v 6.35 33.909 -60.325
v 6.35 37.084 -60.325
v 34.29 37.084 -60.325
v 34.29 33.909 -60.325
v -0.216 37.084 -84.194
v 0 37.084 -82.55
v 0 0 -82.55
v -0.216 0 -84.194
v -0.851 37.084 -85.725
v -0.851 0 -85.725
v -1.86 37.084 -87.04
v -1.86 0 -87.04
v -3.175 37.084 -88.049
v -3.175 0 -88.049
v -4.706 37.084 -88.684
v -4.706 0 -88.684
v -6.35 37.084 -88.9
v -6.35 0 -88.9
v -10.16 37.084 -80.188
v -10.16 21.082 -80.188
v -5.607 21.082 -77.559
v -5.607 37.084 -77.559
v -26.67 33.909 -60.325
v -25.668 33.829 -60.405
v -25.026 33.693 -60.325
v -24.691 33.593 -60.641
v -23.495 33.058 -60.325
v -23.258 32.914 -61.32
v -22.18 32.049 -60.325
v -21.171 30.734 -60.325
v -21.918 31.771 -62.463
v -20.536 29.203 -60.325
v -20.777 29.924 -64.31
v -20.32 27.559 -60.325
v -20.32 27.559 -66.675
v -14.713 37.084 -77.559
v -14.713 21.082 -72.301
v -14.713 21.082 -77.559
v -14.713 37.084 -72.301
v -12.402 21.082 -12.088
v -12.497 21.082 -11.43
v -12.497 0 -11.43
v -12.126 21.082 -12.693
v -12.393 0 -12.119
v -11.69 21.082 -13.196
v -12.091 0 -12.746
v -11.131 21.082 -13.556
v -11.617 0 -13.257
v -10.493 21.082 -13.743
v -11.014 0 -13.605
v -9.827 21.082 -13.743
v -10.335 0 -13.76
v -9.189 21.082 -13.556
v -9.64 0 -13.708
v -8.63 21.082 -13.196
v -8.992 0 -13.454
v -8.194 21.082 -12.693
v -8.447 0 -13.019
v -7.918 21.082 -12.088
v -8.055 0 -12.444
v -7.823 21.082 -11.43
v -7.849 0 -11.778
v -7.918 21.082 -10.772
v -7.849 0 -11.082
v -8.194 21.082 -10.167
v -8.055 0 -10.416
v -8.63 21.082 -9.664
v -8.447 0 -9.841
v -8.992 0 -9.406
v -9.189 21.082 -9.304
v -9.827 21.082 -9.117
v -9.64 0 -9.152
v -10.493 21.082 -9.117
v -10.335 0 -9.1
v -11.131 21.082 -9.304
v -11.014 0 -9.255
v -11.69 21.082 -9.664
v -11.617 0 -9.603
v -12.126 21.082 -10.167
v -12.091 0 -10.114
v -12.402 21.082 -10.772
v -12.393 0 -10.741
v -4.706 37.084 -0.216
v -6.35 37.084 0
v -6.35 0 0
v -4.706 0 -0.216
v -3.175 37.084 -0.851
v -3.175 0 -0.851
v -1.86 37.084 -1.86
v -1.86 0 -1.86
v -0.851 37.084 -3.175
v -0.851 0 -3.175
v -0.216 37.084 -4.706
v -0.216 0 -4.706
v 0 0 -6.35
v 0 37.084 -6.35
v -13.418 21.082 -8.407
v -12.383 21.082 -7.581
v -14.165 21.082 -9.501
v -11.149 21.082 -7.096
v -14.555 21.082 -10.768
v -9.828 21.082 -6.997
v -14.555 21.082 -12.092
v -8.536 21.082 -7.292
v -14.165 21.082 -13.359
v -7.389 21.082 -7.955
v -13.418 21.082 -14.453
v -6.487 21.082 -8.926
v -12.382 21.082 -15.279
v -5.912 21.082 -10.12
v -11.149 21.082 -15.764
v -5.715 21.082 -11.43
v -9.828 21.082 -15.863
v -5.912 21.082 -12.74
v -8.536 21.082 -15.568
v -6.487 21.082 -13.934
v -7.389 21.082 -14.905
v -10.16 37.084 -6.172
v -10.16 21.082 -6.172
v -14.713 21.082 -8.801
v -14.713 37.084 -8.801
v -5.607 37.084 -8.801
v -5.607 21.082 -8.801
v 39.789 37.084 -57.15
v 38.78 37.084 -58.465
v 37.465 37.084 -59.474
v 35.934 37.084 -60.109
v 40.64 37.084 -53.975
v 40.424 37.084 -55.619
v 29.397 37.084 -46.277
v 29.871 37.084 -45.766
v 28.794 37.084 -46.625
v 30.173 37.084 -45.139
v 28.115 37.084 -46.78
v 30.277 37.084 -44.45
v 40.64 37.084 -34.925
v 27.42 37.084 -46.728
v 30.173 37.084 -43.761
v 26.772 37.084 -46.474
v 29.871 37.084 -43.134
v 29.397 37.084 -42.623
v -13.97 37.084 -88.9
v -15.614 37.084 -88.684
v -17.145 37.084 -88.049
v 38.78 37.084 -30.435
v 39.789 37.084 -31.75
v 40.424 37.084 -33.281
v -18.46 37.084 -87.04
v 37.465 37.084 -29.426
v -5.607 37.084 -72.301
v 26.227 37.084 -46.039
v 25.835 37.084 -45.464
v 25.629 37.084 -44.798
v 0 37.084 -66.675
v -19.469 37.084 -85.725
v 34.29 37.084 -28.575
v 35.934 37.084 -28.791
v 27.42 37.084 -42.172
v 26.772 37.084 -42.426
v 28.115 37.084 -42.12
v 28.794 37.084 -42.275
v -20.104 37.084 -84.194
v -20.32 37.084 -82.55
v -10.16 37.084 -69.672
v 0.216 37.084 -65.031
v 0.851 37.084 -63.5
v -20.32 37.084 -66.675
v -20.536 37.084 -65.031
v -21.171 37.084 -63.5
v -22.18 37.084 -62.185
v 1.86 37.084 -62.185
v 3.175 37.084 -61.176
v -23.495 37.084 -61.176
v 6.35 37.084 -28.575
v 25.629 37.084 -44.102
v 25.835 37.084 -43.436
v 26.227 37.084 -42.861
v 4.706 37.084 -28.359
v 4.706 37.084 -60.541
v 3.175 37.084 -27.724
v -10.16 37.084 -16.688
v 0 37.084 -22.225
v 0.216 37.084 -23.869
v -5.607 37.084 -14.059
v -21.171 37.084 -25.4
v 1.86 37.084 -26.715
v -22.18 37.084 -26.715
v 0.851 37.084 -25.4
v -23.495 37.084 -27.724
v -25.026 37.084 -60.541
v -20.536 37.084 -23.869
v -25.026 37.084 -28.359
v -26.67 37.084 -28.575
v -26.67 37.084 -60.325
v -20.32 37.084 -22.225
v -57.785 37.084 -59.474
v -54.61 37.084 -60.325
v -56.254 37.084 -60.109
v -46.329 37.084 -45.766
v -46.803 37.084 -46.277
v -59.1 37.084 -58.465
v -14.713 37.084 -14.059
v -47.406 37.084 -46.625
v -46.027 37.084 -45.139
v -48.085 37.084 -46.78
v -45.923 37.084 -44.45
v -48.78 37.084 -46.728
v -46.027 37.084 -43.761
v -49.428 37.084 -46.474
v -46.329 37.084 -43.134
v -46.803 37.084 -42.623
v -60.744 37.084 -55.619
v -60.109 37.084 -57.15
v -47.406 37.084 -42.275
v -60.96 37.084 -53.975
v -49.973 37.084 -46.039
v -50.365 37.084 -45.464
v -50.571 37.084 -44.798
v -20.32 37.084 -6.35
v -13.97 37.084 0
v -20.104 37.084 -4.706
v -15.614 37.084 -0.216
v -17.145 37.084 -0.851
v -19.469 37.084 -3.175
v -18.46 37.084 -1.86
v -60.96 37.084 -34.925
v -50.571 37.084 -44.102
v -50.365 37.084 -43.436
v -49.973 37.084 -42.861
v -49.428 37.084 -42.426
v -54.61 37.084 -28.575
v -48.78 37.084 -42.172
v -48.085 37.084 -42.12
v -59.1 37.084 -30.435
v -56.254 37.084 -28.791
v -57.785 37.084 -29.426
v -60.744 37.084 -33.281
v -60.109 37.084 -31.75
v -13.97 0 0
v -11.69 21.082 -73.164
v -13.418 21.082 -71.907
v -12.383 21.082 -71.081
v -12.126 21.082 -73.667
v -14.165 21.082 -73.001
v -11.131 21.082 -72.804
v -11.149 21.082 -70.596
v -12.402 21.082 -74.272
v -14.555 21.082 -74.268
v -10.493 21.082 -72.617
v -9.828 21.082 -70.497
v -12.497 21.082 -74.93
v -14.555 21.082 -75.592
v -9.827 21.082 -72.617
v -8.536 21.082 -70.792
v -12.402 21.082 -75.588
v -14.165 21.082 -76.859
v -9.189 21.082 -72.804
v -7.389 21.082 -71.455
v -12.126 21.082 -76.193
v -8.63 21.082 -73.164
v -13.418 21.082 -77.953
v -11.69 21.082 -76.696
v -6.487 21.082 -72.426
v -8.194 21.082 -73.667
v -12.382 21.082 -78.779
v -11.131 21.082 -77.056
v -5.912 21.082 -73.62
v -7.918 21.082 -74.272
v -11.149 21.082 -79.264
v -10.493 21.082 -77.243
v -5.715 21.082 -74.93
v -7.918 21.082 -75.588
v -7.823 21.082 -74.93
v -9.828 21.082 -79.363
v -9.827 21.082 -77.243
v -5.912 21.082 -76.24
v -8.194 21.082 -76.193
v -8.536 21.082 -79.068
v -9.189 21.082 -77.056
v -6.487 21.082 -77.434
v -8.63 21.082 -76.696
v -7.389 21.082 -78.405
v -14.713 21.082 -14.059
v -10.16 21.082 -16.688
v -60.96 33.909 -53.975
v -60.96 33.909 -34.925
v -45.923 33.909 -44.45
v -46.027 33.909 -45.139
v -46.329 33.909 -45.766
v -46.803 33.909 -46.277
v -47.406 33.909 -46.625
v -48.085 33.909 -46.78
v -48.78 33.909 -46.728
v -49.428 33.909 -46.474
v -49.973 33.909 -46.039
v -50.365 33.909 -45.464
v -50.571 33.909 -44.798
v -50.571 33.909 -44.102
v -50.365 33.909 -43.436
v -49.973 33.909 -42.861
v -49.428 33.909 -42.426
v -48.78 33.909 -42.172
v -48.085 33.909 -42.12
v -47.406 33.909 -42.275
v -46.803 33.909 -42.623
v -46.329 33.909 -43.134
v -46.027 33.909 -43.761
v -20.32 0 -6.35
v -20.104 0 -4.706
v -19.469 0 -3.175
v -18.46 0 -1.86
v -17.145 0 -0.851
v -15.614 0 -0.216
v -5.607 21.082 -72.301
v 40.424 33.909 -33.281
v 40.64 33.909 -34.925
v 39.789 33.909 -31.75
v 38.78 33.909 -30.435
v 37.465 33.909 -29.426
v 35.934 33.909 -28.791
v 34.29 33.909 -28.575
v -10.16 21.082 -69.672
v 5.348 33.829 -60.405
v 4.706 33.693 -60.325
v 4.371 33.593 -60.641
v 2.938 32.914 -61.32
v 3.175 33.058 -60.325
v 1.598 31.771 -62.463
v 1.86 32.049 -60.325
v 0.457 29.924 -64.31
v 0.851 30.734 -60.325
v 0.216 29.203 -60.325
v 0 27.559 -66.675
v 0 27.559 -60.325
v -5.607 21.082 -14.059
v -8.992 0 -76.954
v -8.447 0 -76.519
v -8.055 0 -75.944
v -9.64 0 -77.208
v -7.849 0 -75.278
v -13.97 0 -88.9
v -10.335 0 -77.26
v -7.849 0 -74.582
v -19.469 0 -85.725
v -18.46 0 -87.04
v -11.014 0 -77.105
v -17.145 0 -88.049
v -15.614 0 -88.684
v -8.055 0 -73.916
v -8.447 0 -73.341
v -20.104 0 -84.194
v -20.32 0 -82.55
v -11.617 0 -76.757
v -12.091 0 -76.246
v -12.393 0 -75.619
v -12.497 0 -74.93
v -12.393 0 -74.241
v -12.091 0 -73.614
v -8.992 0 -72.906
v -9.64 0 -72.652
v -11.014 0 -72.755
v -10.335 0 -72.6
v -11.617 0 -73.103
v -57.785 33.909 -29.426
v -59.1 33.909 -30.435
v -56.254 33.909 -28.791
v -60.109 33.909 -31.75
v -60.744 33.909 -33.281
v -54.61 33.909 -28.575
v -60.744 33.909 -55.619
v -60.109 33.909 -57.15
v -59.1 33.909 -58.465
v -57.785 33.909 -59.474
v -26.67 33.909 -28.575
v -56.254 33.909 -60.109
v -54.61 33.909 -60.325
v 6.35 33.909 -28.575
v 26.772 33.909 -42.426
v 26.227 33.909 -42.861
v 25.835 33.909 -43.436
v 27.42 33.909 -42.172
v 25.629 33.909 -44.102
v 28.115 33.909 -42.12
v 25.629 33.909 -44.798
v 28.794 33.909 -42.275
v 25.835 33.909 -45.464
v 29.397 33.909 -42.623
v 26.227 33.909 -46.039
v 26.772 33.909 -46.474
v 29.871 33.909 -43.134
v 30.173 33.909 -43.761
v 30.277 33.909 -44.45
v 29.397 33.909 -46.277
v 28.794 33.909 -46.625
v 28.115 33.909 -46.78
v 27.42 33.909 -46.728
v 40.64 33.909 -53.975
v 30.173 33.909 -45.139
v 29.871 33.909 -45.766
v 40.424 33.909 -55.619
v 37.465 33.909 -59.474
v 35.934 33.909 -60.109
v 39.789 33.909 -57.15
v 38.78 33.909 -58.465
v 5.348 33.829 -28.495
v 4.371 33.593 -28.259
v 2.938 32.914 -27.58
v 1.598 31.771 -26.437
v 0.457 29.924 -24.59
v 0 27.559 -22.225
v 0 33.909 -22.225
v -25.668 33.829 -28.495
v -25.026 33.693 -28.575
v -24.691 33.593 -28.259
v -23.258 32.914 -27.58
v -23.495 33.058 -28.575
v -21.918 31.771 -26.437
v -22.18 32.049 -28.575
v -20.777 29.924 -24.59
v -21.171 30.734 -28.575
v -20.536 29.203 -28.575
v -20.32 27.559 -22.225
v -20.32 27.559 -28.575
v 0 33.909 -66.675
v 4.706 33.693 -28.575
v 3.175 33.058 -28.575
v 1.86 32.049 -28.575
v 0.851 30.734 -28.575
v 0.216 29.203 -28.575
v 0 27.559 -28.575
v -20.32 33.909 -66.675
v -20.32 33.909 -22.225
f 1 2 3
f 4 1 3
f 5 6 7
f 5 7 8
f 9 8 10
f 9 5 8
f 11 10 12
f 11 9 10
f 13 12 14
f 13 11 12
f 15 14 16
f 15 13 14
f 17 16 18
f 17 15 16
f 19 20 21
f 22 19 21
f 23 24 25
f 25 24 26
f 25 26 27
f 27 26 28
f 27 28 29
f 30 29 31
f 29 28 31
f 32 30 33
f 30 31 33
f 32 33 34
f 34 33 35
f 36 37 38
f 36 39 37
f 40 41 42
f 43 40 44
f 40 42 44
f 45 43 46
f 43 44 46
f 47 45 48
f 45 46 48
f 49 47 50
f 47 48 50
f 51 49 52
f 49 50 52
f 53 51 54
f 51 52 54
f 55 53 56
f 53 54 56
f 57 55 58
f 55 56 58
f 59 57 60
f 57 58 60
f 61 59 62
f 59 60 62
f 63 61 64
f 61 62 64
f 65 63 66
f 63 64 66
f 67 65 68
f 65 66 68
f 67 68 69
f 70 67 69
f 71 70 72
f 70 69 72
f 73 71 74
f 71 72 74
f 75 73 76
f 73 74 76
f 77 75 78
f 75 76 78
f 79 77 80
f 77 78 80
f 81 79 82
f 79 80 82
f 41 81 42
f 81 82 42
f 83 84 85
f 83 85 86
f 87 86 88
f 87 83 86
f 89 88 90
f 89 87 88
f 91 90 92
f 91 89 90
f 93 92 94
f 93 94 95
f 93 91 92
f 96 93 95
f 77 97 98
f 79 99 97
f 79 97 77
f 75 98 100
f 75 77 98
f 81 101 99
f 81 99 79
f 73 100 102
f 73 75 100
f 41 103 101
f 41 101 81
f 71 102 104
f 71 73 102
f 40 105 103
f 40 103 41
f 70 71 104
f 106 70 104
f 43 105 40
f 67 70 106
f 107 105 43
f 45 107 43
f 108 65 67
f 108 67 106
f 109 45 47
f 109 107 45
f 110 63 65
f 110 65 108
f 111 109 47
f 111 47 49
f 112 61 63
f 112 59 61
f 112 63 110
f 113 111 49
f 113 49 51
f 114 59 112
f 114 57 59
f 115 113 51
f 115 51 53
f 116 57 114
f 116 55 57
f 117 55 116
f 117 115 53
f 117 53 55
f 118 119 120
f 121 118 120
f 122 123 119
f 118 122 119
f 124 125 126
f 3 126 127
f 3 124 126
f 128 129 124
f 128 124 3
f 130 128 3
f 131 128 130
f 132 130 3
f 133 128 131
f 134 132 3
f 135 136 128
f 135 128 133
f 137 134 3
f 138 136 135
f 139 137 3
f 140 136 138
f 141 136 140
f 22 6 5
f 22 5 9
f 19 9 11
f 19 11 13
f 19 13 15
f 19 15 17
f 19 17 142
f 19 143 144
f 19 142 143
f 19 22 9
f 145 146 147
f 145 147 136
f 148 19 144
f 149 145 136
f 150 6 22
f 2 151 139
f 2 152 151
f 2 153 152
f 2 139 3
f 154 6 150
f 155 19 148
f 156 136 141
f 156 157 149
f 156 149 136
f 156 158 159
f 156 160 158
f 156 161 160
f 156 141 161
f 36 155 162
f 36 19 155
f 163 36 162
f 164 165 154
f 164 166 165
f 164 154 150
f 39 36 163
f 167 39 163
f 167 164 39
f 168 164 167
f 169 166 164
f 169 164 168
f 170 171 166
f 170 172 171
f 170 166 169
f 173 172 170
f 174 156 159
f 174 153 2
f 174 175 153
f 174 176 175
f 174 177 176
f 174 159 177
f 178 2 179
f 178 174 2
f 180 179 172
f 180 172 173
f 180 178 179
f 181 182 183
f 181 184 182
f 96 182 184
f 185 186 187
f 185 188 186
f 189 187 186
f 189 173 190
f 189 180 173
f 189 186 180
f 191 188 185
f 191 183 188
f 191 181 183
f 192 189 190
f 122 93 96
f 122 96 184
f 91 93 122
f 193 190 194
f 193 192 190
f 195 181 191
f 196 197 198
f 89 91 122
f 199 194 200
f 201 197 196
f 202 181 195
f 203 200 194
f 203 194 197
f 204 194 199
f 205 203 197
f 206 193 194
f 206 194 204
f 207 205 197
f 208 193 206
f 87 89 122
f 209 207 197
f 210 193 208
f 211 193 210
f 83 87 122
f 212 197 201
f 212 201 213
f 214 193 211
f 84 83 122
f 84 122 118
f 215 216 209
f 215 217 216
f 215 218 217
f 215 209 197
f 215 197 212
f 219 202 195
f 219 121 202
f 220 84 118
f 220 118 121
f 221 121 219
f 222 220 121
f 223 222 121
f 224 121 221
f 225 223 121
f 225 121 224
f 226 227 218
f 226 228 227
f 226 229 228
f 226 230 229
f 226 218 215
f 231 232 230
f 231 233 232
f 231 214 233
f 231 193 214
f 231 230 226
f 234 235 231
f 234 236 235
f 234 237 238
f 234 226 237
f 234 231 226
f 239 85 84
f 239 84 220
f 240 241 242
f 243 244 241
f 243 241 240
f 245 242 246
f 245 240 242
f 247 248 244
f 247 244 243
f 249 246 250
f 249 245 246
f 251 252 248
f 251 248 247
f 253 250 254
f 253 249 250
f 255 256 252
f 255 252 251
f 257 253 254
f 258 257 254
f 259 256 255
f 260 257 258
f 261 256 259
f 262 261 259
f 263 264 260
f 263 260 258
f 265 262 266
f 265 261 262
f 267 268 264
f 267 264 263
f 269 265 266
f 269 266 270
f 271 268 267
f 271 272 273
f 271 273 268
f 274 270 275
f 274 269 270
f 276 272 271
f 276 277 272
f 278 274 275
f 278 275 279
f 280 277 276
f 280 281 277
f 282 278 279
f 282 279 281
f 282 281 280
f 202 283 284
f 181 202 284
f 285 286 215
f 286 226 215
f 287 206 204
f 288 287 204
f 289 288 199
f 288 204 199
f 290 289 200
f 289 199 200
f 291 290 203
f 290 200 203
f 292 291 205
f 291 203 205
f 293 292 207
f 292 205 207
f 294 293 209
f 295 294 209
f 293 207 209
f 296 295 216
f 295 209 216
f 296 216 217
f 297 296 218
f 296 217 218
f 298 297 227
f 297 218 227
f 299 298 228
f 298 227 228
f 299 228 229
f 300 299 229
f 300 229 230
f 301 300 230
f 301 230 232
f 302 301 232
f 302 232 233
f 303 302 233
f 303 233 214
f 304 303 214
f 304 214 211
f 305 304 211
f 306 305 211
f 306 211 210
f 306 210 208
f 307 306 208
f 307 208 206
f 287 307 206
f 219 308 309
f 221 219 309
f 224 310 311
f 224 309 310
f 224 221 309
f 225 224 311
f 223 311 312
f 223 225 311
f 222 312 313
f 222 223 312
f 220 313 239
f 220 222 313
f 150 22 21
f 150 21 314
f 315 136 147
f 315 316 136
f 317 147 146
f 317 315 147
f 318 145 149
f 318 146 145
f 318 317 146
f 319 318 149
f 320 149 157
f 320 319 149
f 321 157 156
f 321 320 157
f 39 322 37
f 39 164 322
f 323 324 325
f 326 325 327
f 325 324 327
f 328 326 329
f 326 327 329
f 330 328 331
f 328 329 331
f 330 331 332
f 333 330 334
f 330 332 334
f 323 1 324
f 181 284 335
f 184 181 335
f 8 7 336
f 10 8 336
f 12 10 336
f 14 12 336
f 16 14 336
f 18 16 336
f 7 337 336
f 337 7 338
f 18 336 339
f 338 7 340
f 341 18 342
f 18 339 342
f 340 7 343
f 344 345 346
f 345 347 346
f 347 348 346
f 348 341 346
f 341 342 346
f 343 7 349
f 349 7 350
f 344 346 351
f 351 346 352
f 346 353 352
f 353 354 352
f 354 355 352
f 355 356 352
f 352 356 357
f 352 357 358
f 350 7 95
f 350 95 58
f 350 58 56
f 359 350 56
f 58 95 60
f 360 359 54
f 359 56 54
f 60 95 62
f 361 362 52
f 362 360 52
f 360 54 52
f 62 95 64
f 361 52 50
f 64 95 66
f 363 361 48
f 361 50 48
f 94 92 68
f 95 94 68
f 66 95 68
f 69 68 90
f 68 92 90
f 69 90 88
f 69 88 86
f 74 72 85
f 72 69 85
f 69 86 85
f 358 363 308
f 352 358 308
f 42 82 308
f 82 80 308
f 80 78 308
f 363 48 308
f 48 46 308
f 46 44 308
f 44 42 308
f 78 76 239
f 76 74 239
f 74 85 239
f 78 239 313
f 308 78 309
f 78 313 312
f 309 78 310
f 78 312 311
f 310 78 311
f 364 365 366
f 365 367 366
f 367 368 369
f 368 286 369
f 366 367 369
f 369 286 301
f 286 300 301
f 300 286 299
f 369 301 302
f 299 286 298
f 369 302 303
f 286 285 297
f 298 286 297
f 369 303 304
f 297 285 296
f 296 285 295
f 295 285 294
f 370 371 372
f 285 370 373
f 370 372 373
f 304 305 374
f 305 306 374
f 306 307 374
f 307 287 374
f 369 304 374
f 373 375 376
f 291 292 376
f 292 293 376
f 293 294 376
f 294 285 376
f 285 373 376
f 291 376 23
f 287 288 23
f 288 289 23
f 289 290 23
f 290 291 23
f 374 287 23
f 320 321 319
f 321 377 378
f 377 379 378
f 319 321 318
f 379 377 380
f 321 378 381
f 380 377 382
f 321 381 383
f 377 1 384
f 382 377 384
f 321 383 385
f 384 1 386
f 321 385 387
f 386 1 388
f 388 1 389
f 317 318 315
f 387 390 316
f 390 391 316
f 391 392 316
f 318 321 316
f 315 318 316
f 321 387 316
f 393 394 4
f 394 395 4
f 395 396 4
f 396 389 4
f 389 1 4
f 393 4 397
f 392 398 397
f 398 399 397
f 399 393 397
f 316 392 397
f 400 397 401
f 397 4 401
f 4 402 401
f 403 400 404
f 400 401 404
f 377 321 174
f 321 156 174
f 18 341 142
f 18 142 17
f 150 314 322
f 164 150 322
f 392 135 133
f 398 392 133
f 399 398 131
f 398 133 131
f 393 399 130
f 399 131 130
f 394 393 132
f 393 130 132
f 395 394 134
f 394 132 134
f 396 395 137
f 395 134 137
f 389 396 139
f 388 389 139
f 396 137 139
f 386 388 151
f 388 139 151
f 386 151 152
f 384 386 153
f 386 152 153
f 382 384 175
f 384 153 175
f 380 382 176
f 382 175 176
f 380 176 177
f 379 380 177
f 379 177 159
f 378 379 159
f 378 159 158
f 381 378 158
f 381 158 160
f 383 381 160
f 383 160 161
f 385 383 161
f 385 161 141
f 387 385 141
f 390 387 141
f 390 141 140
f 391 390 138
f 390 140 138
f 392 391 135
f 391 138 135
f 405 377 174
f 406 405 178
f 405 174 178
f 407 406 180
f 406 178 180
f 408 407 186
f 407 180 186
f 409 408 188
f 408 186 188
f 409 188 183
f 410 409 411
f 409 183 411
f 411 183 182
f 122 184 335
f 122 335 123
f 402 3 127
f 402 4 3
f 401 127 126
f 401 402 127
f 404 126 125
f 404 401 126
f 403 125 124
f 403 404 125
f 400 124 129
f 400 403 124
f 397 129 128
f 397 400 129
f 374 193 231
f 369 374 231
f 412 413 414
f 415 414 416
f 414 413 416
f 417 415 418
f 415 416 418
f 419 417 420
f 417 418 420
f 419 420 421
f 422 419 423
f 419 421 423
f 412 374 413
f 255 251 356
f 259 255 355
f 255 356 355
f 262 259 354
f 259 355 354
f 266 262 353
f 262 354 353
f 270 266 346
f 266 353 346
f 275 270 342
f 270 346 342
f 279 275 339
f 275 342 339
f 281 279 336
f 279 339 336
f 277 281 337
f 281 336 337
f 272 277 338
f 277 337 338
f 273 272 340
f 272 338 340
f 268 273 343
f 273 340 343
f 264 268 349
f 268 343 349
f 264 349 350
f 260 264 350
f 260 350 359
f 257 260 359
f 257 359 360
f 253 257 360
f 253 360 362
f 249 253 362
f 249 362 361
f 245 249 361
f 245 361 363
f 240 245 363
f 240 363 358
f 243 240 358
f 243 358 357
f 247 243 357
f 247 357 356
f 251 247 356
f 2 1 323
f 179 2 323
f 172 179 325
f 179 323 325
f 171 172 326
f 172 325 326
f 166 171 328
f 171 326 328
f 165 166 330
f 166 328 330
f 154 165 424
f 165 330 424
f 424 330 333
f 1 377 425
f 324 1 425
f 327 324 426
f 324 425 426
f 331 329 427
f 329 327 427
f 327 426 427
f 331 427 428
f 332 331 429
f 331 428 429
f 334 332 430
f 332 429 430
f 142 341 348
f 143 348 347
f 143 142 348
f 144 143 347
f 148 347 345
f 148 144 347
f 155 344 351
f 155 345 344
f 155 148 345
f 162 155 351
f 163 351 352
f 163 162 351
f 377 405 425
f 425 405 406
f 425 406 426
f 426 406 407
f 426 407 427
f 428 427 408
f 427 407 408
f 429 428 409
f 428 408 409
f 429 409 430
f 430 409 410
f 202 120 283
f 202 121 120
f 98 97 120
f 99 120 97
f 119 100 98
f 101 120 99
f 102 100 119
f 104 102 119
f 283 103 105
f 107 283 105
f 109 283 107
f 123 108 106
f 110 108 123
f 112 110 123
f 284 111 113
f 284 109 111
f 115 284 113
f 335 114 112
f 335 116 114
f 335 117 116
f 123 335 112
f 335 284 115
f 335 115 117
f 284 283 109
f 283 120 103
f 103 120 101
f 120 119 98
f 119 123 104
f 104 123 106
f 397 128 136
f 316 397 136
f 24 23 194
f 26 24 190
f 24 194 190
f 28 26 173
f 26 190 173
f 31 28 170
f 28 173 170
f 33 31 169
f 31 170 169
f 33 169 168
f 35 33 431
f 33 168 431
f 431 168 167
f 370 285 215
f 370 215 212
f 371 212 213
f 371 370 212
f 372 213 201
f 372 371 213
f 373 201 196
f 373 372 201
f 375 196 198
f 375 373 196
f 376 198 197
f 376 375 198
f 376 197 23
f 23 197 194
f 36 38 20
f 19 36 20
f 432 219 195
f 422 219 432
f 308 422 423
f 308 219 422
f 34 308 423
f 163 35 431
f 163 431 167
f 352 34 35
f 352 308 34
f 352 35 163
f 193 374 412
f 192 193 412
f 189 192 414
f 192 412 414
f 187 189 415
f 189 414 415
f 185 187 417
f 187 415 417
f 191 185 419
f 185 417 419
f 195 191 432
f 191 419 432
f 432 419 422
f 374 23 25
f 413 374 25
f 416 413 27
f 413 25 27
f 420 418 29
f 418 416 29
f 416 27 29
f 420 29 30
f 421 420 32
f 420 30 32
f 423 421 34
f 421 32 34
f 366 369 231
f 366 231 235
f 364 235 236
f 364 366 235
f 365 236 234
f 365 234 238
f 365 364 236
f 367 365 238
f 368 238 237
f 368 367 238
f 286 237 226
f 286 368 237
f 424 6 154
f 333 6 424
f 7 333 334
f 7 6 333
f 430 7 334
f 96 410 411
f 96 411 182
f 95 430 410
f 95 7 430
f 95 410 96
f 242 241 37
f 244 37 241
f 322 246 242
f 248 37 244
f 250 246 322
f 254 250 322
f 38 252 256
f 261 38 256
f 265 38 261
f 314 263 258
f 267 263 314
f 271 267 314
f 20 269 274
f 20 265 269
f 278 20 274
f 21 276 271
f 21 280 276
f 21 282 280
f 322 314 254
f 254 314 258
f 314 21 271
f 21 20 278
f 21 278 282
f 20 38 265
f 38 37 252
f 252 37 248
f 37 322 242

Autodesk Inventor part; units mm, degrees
ref_plane "YZ Plane" through (0, 0, 0) normal (1, 0, 0) x (0, 1, 0)
ref_plane "XZ Plane" through (0, 0, 0) normal (0, 1, 0) x (-1, 0, 0)
ref_plane "XY Plane" through (0, 0, 0) normal (0, 0, 1) x (1, 0, 0)
sketch "Sketch1" plane through (0, 0, 0) normal (0, 1, 0) x (-1, 0, 0)
  line L0 (0, 0) -> (20.32, 0)
  line L1 (20.32, 0) -> (20.32, -88.9)
  line L2 (20.32, -88.9) -> (0, -88.9)
  line L3 (0, -88.9) -> (0, 0)
  line L4 (10.16, -88.9) -> (10.16, -74.93) construction
  circle A0 centre (10.16, -74.93) radius 2.3368
  circle A1 centre (10.16, -11.43) radius 2.3368
  dimension "d0" = 20.32
  dimension "d1" = 88.9
  dimension "d2" = 13.97
  dimension "d3" = 4.6736
  dimension "d4" = 63.5
extrude "Extrusion1" add sketch "Sketch1" along normal blind 37.084
sketch "Sketch2" plane through (0, 37.084, 0) normal (0, 1, 0) x (1, 0, 0)
  line L0 (-60.96, 60.325) -> (40.64, 60.325)
  line L1 (40.64, 60.325) -> (40.64, 28.575)
  line L2 (40.64, 28.575) -> (-60.96, 28.575)
  line L3 (-60.96, 28.575) -> (-60.96, 60.325)
  line L4 (0, 88.9) -> (-20.32, 88.9) projected
  line L5 (-10.16, 60.325) -> (-10.16, 28.575)
  line L6 (-60.96, 44.45) -> (40.64, 44.45) construction
  circle A0 centre (-48.26, 44.45) radius 2.3368
  circle A1 centre (27.94, 44.45) radius 2.3368
  circle A2 centre (-10.16, 74.93) radius 2.3368 projected
  line L7 (-10.16, 88.9) -> (-10.16, 44.45)
  point P0 (0, 0)
  point P1 (-12.351, 76.2)
  point P2 (-15.843, 76.2)
  dimension "d8" = 31.75
  dimension "d9" = 101.6
  dimension "d11" = 4.6736
  dimension "d17" = 44.45
  dimension "d18" = 38.1
  dimension "d19" = 38.1
extrude "Extrusion2" add sketch "Sketch2" against normal blind 3.175 contours L0 L5 L2 L3 | L0 L1 L2 L5
sketch "Sketch3" plane through (0, 37.084, 0) normal (0, 1, 0) x (1, 0, 0)
  circle A0 centre (-10.16, 11.43) radius 2.3368 projected
  circle A1 centre (-10.16, 11.43) radius 4.445
  circle A2 centre (-10.16, 74.93) radius 2.3368 projected
  circle A3 centre (-10.16, 74.93) radius 4.445
  point P0 (0, 0)
  dimension "d20" = 8.89
extrude "Extrusion3" cut sketch "Sketch3" against normal blind 16.002 contours A0 | A1 | A2 | A3
fillet "Fillet1" radius 6.35 4 edges at (-20.32, 18.542, -88.9) (0, 18.542, -88.9) (-20.32, 18.542, 0) (0, 18.542, 0)
fillet "Fillet2" radius 6.35 8 edges at (-60.96, 35.4965, -60.325) (-60.96, 35.4965, -28.575) (-20.32, 35.4965, -28.575) (0, 35.4965, -28.575) (40.64, 35.4965, -28.575) (40.64, 35.4965, -60.325) (0, 35.4965, -60.325) (-20.32, 35.4965, -60.325)
fillet "Fillet3" radius 6.35 2 edges at (-20.32, 33.909, -44.45) (0, 33.909, -44.45)
sketch "Sketch4" plane through (0, 37.084, 0) normal (0, 1, 0) x (1, 0, 0)
  line L0 (-6.35, 88.9) -> (-13.97, 88.9) projected
  line L1 (-10.16, 88.9) -> (-10.16, 0)
  line L2 (-13.97, 0) -> (-6.35, 0) projected
  circle A0 centre (-10.16, 74.93) radius 2.3368 projected
  line L3 (-10.16, 80.1878) -> (-5.6066, 77.5589)
  line L4 (-5.6066, 77.5589) -> (-5.6066, 72.3011)
  line L5 (-5.6066, 72.3011) -> (-10.16, 69.6722)
  line L6 (-10.16, 69.6722) -> (-14.7134, 72.3011)
  line L7 (-14.7134, 72.3011) -> (-14.7134, 77.5589)
  line L8 (-14.7134, 77.5589) -> (-10.16, 80.1878)
  circle A1 centre (-10.16, 11.43) radius 2.3368 projected
  line L9 (-10.16, 16.6878) -> (-5.6066, 14.0589)
  line L10 (-5.6066, 14.0589) -> (-5.6066, 8.8011)
  line L11 (-5.6066, 8.8011) -> (-10.16, 6.1722)
  line L12 (-10.16, 6.1722) -> (-14.7134, 8.8011)
  line L13 (-14.7134, 8.8011) -> (-14.7134, 14.0589)
  line L14 (-14.7134, 14.0589) -> (-10.16, 16.6878)
  point P0 (0, 0)
  dimension "d26" = 5.2578
  dimension "d27" = 5.2578
extrude "Extrusion4" cut sketch "Sketch4" against normal up to surface (16.002 mm away) contours L9 L10 L11 L1 A1 | L1 A1 L12 L13 L14 | L6 L7 L8 L1 A0 | L1 A0 L3 L4 L5
properties part number "BRAIN_MOUNT"
